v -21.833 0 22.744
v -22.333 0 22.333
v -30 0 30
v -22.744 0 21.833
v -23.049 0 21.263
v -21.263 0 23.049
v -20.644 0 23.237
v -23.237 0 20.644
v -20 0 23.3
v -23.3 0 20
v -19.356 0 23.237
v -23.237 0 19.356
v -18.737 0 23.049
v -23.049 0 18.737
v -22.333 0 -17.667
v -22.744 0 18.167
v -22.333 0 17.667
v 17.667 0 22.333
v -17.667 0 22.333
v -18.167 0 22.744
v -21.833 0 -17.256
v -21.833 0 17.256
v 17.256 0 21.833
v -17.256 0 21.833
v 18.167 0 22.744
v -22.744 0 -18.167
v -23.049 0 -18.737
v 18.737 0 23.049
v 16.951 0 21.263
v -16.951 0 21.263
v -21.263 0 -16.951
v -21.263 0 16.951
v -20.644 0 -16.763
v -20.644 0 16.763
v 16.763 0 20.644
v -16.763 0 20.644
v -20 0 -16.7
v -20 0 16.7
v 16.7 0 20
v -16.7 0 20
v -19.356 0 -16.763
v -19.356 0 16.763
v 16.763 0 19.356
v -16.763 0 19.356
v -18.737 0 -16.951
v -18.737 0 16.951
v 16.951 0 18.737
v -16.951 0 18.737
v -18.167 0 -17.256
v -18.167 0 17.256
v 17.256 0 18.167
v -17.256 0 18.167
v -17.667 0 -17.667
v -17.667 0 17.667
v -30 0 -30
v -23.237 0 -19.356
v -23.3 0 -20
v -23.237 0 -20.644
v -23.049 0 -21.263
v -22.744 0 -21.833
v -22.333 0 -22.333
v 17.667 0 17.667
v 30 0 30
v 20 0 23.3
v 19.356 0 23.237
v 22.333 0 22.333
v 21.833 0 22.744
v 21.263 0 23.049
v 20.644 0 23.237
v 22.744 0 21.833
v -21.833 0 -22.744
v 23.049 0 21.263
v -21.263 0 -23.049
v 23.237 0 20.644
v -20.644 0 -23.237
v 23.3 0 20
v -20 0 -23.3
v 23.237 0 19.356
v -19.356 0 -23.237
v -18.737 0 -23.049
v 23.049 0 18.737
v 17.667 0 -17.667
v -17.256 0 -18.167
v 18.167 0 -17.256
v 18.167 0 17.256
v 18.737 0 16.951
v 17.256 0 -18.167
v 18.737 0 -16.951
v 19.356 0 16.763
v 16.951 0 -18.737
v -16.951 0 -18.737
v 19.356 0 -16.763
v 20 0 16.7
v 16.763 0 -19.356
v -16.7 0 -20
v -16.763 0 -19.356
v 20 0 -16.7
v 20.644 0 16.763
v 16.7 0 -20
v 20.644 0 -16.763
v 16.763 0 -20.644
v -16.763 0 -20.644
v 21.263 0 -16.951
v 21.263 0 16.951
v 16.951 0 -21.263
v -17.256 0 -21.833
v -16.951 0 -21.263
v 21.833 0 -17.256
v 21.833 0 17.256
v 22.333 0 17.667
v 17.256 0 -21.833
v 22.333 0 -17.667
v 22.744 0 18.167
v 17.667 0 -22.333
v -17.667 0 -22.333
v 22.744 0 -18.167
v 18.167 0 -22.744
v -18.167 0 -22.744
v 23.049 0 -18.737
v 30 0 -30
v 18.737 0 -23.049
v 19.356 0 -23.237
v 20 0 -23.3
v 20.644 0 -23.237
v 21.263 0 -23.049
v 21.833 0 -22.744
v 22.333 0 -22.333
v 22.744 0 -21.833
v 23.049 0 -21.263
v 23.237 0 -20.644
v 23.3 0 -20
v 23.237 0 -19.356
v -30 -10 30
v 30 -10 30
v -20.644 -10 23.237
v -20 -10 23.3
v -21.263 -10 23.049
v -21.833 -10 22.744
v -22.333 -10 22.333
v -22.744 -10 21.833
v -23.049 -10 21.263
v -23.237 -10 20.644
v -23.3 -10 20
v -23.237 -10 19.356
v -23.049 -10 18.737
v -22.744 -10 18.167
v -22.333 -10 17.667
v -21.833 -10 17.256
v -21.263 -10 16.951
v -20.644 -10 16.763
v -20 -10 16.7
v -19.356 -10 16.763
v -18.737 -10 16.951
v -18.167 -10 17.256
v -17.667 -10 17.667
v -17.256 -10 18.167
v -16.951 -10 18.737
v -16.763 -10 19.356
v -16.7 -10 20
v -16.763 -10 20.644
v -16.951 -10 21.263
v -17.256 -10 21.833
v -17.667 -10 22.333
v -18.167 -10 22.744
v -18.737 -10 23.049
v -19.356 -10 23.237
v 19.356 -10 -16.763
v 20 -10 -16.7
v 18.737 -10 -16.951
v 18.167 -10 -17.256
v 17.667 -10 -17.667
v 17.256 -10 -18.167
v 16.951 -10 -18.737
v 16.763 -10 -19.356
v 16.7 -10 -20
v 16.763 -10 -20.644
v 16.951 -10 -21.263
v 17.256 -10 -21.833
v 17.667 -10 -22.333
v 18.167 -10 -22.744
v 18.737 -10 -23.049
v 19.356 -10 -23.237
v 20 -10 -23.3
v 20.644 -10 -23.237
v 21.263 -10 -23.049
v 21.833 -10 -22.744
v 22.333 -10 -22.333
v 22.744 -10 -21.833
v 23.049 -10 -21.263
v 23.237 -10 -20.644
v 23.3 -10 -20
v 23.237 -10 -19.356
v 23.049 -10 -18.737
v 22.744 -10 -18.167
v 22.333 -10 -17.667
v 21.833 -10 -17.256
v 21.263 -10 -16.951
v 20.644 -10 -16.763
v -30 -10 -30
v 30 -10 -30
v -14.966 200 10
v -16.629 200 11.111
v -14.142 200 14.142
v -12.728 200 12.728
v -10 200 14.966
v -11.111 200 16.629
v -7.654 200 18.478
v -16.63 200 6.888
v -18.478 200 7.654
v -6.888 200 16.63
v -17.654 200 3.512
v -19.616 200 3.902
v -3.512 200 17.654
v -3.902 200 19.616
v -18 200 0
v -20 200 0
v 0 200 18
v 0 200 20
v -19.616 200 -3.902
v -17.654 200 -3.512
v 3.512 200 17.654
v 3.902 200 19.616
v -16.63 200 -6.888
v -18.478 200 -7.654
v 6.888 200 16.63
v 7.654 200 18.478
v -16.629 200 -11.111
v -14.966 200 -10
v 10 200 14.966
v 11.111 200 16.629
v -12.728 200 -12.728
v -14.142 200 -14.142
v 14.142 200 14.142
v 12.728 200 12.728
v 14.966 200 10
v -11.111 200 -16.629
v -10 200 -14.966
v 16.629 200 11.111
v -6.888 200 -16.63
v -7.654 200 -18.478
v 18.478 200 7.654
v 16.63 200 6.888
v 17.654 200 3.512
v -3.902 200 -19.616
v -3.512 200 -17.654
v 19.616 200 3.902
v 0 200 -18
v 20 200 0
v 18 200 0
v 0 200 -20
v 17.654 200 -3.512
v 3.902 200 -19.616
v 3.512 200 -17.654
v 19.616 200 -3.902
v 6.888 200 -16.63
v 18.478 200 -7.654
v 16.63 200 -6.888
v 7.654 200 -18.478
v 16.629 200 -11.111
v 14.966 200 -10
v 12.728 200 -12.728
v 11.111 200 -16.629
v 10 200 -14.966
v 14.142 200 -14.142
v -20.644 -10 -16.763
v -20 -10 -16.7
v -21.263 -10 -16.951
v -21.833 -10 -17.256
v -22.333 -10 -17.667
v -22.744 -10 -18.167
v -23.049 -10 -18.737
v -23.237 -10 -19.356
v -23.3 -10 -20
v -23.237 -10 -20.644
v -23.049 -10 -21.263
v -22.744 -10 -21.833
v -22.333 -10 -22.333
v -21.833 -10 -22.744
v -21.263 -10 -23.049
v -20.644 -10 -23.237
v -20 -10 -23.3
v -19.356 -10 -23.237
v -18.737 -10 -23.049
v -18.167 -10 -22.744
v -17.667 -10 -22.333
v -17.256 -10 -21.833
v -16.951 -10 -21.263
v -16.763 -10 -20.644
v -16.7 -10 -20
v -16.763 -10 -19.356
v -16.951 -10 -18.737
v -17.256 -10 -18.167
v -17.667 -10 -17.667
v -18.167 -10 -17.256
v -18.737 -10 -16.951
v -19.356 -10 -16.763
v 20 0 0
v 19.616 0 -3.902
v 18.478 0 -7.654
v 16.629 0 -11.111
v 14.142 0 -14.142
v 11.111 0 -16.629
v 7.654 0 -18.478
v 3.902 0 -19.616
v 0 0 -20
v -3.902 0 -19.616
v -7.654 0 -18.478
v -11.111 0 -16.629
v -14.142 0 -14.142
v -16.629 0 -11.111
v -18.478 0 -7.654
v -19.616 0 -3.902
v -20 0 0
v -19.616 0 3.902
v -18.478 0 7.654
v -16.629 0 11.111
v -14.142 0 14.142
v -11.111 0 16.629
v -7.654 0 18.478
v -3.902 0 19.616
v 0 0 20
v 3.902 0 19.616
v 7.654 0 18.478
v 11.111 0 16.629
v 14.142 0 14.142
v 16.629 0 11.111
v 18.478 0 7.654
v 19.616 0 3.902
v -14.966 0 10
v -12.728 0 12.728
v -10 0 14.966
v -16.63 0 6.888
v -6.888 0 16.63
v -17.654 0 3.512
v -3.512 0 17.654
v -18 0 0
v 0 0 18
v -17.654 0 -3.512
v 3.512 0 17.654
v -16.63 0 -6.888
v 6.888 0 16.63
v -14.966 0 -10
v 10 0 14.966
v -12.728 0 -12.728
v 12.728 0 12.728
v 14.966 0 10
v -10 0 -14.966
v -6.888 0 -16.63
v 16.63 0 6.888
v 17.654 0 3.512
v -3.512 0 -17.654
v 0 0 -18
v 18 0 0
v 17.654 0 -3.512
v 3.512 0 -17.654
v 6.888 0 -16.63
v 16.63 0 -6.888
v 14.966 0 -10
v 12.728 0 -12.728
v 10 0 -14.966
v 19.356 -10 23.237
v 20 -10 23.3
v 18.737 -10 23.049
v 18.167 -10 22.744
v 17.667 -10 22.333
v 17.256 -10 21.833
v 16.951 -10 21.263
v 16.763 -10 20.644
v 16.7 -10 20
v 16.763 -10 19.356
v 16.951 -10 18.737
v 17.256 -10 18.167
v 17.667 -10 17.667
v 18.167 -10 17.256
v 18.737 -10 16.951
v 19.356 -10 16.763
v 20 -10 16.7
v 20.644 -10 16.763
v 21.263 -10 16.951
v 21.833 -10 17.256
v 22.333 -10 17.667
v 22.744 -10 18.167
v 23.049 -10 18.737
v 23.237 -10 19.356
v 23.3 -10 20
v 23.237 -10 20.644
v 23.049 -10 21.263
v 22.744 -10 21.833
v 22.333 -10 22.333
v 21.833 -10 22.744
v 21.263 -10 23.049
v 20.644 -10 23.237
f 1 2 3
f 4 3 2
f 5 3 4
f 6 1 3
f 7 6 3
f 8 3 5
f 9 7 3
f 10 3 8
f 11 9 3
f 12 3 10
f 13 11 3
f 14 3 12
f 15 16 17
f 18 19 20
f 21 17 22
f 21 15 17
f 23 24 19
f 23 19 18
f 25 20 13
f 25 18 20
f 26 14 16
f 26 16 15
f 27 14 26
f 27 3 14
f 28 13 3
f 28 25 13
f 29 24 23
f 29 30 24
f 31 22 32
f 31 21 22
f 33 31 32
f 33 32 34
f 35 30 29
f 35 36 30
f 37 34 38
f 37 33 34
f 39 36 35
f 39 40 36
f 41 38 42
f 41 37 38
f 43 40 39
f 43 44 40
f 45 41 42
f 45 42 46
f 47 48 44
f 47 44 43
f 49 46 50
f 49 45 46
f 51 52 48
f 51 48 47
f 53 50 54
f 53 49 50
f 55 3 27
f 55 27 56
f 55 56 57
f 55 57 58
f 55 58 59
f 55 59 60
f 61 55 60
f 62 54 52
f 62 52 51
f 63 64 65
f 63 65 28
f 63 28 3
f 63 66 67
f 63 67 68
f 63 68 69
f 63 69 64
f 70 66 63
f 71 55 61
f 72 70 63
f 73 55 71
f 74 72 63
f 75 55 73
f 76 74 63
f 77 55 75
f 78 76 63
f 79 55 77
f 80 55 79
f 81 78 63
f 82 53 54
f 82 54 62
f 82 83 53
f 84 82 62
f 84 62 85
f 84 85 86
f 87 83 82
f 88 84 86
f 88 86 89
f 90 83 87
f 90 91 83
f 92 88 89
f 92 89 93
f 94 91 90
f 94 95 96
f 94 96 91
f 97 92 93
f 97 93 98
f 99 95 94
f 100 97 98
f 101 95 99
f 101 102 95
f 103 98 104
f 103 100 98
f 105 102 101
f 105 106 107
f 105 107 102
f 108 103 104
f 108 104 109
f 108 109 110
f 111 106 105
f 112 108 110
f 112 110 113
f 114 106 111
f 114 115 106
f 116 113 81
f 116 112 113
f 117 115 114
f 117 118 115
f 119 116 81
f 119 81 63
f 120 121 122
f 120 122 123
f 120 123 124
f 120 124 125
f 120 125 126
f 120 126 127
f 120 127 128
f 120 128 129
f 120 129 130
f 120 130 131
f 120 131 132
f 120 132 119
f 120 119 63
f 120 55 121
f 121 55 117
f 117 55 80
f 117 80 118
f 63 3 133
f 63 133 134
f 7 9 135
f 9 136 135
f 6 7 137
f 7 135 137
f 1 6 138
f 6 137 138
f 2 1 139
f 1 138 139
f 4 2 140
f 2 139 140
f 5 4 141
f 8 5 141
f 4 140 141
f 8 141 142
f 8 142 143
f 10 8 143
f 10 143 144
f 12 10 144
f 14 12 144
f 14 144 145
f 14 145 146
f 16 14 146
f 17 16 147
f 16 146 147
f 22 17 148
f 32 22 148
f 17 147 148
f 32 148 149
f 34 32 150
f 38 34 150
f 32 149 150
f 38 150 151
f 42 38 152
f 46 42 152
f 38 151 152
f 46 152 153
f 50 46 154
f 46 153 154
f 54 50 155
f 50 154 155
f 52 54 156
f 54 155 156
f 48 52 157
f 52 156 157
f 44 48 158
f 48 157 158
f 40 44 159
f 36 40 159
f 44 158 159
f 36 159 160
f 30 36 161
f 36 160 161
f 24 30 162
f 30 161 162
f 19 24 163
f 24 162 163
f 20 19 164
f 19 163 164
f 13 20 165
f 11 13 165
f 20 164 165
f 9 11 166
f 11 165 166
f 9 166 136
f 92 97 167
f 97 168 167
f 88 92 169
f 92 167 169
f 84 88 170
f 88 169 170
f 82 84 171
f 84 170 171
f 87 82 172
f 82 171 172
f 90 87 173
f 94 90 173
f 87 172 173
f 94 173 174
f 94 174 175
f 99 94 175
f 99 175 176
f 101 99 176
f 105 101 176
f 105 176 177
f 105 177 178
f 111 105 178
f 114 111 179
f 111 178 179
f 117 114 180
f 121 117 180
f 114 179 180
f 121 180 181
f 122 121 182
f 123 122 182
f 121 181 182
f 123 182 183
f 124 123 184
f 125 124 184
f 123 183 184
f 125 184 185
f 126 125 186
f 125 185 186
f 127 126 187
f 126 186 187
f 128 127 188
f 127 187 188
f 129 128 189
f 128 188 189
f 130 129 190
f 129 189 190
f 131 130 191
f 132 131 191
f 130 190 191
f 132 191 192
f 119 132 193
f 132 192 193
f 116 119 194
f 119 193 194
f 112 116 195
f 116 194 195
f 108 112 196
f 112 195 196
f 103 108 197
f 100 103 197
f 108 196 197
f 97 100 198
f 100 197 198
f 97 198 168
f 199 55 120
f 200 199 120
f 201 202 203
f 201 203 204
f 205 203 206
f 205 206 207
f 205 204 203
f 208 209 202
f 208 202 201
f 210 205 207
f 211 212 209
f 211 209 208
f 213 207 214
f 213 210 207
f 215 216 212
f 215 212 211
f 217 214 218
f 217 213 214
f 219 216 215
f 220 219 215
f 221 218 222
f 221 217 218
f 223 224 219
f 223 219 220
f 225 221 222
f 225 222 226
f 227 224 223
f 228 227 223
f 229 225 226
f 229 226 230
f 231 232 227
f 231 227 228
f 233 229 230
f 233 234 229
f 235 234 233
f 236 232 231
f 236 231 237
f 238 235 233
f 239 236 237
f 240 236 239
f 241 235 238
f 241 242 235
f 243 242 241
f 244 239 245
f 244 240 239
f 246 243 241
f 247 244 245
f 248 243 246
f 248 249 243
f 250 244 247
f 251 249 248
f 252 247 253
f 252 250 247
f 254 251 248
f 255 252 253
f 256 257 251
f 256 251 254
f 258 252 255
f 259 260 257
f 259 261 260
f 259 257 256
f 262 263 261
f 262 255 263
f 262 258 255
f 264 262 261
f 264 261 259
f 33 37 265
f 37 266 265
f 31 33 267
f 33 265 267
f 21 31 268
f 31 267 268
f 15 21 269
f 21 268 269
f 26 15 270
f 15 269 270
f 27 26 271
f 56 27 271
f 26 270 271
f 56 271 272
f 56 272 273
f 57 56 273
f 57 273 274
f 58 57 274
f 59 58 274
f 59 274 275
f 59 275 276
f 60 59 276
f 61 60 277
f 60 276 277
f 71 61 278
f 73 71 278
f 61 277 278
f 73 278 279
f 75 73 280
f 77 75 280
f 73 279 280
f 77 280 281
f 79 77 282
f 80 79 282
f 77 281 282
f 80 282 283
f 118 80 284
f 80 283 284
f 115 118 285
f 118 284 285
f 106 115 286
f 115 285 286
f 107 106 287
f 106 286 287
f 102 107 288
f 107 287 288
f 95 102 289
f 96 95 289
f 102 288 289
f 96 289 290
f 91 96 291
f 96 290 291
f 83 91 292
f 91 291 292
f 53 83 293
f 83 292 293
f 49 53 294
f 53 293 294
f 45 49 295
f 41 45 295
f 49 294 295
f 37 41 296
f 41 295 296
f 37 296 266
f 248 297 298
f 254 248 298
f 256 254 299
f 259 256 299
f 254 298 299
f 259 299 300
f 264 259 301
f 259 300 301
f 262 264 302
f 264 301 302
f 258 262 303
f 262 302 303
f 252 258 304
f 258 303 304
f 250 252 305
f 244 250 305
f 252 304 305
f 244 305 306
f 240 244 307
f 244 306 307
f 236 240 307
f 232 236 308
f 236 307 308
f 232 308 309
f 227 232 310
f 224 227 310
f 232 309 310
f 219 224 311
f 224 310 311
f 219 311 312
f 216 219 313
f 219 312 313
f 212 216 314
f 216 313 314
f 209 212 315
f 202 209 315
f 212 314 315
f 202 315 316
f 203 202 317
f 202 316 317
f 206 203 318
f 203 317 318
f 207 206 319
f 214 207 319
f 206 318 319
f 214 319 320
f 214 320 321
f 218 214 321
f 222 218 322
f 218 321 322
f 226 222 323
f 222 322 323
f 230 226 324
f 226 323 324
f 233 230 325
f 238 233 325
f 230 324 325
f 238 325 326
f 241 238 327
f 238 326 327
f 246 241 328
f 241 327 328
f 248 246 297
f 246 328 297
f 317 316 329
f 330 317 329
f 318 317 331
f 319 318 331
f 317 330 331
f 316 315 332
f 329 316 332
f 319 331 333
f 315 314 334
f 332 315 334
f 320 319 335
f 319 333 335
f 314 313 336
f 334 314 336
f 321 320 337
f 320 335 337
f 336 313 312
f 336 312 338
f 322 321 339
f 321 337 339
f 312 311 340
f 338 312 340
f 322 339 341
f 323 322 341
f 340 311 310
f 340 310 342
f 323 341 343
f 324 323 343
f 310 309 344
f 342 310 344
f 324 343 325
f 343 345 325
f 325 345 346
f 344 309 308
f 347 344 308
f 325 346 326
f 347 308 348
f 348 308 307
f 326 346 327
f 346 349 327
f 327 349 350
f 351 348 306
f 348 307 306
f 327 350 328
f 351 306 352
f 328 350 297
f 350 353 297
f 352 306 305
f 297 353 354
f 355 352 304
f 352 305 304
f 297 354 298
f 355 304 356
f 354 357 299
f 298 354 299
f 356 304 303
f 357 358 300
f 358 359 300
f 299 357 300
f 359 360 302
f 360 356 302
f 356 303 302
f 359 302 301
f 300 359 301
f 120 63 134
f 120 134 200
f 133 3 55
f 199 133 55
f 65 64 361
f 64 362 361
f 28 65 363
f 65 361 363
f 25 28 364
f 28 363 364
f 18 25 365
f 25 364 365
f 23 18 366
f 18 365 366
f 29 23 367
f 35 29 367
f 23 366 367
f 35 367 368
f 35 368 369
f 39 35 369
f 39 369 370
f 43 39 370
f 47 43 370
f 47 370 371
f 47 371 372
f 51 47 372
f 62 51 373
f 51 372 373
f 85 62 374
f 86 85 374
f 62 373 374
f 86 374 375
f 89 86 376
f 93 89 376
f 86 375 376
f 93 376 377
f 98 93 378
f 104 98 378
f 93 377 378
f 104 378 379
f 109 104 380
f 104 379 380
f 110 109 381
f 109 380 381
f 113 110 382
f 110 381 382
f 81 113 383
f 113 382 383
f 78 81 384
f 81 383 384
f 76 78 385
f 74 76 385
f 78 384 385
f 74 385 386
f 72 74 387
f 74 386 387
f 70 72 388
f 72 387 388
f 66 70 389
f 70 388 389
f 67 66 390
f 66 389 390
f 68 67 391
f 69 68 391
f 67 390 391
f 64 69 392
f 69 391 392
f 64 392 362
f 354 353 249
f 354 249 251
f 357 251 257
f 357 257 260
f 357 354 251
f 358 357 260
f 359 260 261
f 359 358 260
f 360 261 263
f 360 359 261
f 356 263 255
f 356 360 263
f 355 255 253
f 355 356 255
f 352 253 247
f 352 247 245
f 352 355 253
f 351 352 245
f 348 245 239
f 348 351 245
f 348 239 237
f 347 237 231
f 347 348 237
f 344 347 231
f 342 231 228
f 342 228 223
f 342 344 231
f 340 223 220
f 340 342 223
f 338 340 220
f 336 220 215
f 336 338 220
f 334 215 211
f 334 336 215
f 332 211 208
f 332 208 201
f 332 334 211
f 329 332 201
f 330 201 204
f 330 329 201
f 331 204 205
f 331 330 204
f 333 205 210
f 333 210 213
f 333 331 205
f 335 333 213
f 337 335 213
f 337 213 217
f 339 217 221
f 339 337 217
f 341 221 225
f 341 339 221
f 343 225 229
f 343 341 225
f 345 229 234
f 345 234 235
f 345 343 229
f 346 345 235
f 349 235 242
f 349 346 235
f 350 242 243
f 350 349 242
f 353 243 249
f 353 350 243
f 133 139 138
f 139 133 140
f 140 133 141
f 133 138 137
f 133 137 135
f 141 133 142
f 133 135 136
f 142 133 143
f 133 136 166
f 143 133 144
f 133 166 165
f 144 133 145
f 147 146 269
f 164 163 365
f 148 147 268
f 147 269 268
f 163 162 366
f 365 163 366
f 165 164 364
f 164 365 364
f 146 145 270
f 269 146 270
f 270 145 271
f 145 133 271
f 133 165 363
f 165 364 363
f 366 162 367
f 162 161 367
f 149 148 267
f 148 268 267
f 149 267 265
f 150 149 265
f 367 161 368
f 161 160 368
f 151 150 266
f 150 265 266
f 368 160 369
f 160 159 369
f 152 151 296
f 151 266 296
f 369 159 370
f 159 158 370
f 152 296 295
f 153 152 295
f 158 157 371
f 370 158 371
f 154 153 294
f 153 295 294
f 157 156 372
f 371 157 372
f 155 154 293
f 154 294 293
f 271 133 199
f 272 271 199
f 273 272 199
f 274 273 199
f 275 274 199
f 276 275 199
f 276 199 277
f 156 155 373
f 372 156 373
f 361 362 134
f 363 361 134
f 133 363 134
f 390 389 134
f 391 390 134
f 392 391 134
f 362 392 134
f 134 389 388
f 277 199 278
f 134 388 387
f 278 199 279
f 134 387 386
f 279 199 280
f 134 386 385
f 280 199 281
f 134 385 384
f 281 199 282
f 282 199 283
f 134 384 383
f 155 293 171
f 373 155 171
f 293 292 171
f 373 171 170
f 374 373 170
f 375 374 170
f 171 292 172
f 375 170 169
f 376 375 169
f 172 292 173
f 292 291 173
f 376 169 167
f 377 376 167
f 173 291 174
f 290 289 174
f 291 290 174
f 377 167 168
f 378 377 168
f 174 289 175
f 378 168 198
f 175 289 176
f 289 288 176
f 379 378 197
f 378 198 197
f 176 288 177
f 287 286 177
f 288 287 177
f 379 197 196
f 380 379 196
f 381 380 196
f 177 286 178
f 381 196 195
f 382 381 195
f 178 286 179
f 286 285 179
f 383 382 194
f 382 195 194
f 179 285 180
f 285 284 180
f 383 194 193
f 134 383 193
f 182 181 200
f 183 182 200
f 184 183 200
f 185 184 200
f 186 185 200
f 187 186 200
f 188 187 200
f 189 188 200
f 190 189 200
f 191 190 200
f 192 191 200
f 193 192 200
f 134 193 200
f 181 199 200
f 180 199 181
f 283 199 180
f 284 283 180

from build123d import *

# Parameters (mm, degrees)
SKETCH1_R                     = 20
SKETCH1_R_2                   = 18
BOSS_EXTRUDE1_DEPTH           = 200
SKETCH2_W                     = 60
SKETCH2_H                     = 60
BOSS_EXTRUDE2_DEPTH           = 10
SKETCH5_W                     = 3.3
SKETCH5_H                     = 10
M6_CLEARANCE_HOLE1_AT_2_COUNT = 2
M6_CLEARANCE_HOLE1_AT_2_PITCH = 40
M6_CLEARANCE_HOLE1_AT_3_COUNT = 2
M6_CLEARANCE_HOLE1_AT_3_PITCH = 56.568542495
M6_CLEARANCE_HOLE1_AT_4_COUNT = 2
M6_CLEARANCE_HOLE1_AT_4_PITCH = 40


with BuildPart() as part:
    # Sketch1 → Boss-Extrude1 (new body)
    with BuildSketch(Plane(origin=(0, 0, 0), x_dir=(1, 0, 0), z_dir=(0, 1, 0))):
        Circle(SKETCH1_R)
        Circle(SKETCH1_R_2, mode=Mode.SUBTRACT)
    extrude(amount=BOSS_EXTRUDE1_DEPTH)


with BuildPart() as body_2:
    # Sketch2 → Boss-Extrude2 (new body)
    with BuildSketch(Plane(origin=(0, 0, 0), x_dir=(1, 0, 0), z_dir=(0, 1, 0))):
        Rectangle(SKETCH2_W, SKETCH2_H)
    extrude(amount=-BOSS_EXTRUDE2_DEPTH)

    # Sketch5 → M6 Clearance Hole1 (revolve, cut)
    with BuildSketch(Plane(origin=(20, 0, -20), x_dir=(0, 0, 1), z_dir=(1, 0, 0))):
        with Locations((1.65, 5)):
            Rectangle(SKETCH5_W, SKETCH5_H)
    m6_clearance_hole1 = revolve(axis=Axis((20, 6.35, -20), (0, -1, 0)), mode=Mode.SUBTRACT)

    # M6 Clearance Hole1 at 2: M6 Clearance Hole1 ×2
    with Locations(*[(-i * M6_CLEARANCE_HOLE1_AT_2_PITCH, 0, 0) for i in range(1, M6_CLEARANCE_HOLE1_AT_2_COUNT)]):
        add(m6_clearance_hole1, mode=Mode.SUBTRACT)

    # M6 Clearance Hole1 at 3: M6 Clearance Hole1 ×2
    with Locations(*[Vector(-0.707106781, 0, 0.707106781) * (i * M6_CLEARANCE_HOLE1_AT_3_PITCH) for i in range(1, M6_CLEARANCE_HOLE1_AT_3_COUNT)]):
        add(m6_clearance_hole1, mode=Mode.SUBTRACT)

    # M6 Clearance Hole1 at 4: M6 Clearance Hole1 ×2
    with Locations(*[(0, 0, i * M6_CLEARANCE_HOLE1_AT_4_PITCH) for i in range(1, M6_CLEARANCE_HOLE1_AT_4_COUNT)]):
        add(m6_clearance_hole1, mode=Mode.SUBTRACT)


solid = Compound([part.part, body_2.part])
